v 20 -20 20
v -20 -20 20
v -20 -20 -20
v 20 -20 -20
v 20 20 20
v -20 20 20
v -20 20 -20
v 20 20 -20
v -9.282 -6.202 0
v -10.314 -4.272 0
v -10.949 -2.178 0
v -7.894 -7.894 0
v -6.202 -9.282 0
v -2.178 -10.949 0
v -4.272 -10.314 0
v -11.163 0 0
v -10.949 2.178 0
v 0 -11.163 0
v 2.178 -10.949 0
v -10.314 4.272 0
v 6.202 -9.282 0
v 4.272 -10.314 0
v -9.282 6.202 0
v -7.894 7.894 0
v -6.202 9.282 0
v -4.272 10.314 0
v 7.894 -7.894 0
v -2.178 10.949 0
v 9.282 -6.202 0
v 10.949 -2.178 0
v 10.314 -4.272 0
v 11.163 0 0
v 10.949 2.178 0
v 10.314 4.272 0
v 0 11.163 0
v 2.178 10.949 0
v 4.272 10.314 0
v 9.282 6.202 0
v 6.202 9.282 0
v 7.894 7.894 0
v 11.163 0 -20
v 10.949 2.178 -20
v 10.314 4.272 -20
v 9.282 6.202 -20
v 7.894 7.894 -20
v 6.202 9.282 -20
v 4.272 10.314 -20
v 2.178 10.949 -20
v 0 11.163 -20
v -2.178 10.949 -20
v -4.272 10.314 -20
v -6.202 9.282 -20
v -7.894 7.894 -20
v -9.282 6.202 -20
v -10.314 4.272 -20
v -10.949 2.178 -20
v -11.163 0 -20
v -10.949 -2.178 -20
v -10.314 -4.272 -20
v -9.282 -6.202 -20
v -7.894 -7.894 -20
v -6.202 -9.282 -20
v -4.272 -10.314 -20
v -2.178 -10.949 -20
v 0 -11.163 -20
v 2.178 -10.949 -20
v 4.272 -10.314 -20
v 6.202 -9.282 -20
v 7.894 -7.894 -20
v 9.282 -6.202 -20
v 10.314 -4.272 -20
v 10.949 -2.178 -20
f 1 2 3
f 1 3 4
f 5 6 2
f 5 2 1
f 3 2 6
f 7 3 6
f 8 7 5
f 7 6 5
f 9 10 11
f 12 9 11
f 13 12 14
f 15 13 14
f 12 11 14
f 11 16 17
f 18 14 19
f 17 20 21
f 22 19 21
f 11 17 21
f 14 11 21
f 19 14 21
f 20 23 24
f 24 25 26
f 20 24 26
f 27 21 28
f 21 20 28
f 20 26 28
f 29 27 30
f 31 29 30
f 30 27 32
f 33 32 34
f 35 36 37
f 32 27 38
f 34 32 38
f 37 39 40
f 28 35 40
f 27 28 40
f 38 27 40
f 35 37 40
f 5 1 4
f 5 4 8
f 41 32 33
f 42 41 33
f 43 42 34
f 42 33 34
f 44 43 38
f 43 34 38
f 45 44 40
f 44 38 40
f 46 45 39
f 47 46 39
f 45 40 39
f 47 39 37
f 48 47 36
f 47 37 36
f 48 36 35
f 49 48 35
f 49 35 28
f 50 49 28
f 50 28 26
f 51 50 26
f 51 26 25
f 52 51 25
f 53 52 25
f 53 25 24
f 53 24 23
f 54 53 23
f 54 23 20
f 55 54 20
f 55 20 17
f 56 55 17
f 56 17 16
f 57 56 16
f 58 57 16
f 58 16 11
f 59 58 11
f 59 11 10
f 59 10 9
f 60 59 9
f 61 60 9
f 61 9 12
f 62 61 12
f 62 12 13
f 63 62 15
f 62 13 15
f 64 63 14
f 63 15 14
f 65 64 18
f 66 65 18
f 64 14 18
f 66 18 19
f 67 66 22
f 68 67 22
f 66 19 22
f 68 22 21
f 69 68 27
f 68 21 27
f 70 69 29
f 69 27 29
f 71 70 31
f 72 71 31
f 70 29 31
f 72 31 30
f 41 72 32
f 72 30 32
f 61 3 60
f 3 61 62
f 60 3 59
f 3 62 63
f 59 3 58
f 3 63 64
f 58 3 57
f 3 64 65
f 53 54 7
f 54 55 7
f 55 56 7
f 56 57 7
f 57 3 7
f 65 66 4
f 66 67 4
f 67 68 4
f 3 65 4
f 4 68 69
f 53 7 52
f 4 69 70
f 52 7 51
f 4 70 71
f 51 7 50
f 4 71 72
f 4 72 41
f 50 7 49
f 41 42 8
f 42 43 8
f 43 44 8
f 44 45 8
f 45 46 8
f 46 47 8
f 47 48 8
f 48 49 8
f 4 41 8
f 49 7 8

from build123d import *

# Parameters (mm, degrees)
F0_W     = 40
F0_H     = 40
F1_DEPTH = 20
F2_D     = 22.3266
F2_DEPTH = 20.001


with BuildPart() as f1:
    # F0 (on Top) → F1 (new body, symmetric)
    with BuildSketch(Plane.XY):
        Rectangle(F0_W, F0_H)
    extrude(amount=F1_DEPTH, both=True)

    # F2 (through all, one way)
    with BuildSketch(Plane.XY):
        with Locations((0, 0)):
            Circle(F2_D / 2)
    extrude(amount=-F2_DEPTH, mode=Mode.SUBTRACT)


solid = f1.part
